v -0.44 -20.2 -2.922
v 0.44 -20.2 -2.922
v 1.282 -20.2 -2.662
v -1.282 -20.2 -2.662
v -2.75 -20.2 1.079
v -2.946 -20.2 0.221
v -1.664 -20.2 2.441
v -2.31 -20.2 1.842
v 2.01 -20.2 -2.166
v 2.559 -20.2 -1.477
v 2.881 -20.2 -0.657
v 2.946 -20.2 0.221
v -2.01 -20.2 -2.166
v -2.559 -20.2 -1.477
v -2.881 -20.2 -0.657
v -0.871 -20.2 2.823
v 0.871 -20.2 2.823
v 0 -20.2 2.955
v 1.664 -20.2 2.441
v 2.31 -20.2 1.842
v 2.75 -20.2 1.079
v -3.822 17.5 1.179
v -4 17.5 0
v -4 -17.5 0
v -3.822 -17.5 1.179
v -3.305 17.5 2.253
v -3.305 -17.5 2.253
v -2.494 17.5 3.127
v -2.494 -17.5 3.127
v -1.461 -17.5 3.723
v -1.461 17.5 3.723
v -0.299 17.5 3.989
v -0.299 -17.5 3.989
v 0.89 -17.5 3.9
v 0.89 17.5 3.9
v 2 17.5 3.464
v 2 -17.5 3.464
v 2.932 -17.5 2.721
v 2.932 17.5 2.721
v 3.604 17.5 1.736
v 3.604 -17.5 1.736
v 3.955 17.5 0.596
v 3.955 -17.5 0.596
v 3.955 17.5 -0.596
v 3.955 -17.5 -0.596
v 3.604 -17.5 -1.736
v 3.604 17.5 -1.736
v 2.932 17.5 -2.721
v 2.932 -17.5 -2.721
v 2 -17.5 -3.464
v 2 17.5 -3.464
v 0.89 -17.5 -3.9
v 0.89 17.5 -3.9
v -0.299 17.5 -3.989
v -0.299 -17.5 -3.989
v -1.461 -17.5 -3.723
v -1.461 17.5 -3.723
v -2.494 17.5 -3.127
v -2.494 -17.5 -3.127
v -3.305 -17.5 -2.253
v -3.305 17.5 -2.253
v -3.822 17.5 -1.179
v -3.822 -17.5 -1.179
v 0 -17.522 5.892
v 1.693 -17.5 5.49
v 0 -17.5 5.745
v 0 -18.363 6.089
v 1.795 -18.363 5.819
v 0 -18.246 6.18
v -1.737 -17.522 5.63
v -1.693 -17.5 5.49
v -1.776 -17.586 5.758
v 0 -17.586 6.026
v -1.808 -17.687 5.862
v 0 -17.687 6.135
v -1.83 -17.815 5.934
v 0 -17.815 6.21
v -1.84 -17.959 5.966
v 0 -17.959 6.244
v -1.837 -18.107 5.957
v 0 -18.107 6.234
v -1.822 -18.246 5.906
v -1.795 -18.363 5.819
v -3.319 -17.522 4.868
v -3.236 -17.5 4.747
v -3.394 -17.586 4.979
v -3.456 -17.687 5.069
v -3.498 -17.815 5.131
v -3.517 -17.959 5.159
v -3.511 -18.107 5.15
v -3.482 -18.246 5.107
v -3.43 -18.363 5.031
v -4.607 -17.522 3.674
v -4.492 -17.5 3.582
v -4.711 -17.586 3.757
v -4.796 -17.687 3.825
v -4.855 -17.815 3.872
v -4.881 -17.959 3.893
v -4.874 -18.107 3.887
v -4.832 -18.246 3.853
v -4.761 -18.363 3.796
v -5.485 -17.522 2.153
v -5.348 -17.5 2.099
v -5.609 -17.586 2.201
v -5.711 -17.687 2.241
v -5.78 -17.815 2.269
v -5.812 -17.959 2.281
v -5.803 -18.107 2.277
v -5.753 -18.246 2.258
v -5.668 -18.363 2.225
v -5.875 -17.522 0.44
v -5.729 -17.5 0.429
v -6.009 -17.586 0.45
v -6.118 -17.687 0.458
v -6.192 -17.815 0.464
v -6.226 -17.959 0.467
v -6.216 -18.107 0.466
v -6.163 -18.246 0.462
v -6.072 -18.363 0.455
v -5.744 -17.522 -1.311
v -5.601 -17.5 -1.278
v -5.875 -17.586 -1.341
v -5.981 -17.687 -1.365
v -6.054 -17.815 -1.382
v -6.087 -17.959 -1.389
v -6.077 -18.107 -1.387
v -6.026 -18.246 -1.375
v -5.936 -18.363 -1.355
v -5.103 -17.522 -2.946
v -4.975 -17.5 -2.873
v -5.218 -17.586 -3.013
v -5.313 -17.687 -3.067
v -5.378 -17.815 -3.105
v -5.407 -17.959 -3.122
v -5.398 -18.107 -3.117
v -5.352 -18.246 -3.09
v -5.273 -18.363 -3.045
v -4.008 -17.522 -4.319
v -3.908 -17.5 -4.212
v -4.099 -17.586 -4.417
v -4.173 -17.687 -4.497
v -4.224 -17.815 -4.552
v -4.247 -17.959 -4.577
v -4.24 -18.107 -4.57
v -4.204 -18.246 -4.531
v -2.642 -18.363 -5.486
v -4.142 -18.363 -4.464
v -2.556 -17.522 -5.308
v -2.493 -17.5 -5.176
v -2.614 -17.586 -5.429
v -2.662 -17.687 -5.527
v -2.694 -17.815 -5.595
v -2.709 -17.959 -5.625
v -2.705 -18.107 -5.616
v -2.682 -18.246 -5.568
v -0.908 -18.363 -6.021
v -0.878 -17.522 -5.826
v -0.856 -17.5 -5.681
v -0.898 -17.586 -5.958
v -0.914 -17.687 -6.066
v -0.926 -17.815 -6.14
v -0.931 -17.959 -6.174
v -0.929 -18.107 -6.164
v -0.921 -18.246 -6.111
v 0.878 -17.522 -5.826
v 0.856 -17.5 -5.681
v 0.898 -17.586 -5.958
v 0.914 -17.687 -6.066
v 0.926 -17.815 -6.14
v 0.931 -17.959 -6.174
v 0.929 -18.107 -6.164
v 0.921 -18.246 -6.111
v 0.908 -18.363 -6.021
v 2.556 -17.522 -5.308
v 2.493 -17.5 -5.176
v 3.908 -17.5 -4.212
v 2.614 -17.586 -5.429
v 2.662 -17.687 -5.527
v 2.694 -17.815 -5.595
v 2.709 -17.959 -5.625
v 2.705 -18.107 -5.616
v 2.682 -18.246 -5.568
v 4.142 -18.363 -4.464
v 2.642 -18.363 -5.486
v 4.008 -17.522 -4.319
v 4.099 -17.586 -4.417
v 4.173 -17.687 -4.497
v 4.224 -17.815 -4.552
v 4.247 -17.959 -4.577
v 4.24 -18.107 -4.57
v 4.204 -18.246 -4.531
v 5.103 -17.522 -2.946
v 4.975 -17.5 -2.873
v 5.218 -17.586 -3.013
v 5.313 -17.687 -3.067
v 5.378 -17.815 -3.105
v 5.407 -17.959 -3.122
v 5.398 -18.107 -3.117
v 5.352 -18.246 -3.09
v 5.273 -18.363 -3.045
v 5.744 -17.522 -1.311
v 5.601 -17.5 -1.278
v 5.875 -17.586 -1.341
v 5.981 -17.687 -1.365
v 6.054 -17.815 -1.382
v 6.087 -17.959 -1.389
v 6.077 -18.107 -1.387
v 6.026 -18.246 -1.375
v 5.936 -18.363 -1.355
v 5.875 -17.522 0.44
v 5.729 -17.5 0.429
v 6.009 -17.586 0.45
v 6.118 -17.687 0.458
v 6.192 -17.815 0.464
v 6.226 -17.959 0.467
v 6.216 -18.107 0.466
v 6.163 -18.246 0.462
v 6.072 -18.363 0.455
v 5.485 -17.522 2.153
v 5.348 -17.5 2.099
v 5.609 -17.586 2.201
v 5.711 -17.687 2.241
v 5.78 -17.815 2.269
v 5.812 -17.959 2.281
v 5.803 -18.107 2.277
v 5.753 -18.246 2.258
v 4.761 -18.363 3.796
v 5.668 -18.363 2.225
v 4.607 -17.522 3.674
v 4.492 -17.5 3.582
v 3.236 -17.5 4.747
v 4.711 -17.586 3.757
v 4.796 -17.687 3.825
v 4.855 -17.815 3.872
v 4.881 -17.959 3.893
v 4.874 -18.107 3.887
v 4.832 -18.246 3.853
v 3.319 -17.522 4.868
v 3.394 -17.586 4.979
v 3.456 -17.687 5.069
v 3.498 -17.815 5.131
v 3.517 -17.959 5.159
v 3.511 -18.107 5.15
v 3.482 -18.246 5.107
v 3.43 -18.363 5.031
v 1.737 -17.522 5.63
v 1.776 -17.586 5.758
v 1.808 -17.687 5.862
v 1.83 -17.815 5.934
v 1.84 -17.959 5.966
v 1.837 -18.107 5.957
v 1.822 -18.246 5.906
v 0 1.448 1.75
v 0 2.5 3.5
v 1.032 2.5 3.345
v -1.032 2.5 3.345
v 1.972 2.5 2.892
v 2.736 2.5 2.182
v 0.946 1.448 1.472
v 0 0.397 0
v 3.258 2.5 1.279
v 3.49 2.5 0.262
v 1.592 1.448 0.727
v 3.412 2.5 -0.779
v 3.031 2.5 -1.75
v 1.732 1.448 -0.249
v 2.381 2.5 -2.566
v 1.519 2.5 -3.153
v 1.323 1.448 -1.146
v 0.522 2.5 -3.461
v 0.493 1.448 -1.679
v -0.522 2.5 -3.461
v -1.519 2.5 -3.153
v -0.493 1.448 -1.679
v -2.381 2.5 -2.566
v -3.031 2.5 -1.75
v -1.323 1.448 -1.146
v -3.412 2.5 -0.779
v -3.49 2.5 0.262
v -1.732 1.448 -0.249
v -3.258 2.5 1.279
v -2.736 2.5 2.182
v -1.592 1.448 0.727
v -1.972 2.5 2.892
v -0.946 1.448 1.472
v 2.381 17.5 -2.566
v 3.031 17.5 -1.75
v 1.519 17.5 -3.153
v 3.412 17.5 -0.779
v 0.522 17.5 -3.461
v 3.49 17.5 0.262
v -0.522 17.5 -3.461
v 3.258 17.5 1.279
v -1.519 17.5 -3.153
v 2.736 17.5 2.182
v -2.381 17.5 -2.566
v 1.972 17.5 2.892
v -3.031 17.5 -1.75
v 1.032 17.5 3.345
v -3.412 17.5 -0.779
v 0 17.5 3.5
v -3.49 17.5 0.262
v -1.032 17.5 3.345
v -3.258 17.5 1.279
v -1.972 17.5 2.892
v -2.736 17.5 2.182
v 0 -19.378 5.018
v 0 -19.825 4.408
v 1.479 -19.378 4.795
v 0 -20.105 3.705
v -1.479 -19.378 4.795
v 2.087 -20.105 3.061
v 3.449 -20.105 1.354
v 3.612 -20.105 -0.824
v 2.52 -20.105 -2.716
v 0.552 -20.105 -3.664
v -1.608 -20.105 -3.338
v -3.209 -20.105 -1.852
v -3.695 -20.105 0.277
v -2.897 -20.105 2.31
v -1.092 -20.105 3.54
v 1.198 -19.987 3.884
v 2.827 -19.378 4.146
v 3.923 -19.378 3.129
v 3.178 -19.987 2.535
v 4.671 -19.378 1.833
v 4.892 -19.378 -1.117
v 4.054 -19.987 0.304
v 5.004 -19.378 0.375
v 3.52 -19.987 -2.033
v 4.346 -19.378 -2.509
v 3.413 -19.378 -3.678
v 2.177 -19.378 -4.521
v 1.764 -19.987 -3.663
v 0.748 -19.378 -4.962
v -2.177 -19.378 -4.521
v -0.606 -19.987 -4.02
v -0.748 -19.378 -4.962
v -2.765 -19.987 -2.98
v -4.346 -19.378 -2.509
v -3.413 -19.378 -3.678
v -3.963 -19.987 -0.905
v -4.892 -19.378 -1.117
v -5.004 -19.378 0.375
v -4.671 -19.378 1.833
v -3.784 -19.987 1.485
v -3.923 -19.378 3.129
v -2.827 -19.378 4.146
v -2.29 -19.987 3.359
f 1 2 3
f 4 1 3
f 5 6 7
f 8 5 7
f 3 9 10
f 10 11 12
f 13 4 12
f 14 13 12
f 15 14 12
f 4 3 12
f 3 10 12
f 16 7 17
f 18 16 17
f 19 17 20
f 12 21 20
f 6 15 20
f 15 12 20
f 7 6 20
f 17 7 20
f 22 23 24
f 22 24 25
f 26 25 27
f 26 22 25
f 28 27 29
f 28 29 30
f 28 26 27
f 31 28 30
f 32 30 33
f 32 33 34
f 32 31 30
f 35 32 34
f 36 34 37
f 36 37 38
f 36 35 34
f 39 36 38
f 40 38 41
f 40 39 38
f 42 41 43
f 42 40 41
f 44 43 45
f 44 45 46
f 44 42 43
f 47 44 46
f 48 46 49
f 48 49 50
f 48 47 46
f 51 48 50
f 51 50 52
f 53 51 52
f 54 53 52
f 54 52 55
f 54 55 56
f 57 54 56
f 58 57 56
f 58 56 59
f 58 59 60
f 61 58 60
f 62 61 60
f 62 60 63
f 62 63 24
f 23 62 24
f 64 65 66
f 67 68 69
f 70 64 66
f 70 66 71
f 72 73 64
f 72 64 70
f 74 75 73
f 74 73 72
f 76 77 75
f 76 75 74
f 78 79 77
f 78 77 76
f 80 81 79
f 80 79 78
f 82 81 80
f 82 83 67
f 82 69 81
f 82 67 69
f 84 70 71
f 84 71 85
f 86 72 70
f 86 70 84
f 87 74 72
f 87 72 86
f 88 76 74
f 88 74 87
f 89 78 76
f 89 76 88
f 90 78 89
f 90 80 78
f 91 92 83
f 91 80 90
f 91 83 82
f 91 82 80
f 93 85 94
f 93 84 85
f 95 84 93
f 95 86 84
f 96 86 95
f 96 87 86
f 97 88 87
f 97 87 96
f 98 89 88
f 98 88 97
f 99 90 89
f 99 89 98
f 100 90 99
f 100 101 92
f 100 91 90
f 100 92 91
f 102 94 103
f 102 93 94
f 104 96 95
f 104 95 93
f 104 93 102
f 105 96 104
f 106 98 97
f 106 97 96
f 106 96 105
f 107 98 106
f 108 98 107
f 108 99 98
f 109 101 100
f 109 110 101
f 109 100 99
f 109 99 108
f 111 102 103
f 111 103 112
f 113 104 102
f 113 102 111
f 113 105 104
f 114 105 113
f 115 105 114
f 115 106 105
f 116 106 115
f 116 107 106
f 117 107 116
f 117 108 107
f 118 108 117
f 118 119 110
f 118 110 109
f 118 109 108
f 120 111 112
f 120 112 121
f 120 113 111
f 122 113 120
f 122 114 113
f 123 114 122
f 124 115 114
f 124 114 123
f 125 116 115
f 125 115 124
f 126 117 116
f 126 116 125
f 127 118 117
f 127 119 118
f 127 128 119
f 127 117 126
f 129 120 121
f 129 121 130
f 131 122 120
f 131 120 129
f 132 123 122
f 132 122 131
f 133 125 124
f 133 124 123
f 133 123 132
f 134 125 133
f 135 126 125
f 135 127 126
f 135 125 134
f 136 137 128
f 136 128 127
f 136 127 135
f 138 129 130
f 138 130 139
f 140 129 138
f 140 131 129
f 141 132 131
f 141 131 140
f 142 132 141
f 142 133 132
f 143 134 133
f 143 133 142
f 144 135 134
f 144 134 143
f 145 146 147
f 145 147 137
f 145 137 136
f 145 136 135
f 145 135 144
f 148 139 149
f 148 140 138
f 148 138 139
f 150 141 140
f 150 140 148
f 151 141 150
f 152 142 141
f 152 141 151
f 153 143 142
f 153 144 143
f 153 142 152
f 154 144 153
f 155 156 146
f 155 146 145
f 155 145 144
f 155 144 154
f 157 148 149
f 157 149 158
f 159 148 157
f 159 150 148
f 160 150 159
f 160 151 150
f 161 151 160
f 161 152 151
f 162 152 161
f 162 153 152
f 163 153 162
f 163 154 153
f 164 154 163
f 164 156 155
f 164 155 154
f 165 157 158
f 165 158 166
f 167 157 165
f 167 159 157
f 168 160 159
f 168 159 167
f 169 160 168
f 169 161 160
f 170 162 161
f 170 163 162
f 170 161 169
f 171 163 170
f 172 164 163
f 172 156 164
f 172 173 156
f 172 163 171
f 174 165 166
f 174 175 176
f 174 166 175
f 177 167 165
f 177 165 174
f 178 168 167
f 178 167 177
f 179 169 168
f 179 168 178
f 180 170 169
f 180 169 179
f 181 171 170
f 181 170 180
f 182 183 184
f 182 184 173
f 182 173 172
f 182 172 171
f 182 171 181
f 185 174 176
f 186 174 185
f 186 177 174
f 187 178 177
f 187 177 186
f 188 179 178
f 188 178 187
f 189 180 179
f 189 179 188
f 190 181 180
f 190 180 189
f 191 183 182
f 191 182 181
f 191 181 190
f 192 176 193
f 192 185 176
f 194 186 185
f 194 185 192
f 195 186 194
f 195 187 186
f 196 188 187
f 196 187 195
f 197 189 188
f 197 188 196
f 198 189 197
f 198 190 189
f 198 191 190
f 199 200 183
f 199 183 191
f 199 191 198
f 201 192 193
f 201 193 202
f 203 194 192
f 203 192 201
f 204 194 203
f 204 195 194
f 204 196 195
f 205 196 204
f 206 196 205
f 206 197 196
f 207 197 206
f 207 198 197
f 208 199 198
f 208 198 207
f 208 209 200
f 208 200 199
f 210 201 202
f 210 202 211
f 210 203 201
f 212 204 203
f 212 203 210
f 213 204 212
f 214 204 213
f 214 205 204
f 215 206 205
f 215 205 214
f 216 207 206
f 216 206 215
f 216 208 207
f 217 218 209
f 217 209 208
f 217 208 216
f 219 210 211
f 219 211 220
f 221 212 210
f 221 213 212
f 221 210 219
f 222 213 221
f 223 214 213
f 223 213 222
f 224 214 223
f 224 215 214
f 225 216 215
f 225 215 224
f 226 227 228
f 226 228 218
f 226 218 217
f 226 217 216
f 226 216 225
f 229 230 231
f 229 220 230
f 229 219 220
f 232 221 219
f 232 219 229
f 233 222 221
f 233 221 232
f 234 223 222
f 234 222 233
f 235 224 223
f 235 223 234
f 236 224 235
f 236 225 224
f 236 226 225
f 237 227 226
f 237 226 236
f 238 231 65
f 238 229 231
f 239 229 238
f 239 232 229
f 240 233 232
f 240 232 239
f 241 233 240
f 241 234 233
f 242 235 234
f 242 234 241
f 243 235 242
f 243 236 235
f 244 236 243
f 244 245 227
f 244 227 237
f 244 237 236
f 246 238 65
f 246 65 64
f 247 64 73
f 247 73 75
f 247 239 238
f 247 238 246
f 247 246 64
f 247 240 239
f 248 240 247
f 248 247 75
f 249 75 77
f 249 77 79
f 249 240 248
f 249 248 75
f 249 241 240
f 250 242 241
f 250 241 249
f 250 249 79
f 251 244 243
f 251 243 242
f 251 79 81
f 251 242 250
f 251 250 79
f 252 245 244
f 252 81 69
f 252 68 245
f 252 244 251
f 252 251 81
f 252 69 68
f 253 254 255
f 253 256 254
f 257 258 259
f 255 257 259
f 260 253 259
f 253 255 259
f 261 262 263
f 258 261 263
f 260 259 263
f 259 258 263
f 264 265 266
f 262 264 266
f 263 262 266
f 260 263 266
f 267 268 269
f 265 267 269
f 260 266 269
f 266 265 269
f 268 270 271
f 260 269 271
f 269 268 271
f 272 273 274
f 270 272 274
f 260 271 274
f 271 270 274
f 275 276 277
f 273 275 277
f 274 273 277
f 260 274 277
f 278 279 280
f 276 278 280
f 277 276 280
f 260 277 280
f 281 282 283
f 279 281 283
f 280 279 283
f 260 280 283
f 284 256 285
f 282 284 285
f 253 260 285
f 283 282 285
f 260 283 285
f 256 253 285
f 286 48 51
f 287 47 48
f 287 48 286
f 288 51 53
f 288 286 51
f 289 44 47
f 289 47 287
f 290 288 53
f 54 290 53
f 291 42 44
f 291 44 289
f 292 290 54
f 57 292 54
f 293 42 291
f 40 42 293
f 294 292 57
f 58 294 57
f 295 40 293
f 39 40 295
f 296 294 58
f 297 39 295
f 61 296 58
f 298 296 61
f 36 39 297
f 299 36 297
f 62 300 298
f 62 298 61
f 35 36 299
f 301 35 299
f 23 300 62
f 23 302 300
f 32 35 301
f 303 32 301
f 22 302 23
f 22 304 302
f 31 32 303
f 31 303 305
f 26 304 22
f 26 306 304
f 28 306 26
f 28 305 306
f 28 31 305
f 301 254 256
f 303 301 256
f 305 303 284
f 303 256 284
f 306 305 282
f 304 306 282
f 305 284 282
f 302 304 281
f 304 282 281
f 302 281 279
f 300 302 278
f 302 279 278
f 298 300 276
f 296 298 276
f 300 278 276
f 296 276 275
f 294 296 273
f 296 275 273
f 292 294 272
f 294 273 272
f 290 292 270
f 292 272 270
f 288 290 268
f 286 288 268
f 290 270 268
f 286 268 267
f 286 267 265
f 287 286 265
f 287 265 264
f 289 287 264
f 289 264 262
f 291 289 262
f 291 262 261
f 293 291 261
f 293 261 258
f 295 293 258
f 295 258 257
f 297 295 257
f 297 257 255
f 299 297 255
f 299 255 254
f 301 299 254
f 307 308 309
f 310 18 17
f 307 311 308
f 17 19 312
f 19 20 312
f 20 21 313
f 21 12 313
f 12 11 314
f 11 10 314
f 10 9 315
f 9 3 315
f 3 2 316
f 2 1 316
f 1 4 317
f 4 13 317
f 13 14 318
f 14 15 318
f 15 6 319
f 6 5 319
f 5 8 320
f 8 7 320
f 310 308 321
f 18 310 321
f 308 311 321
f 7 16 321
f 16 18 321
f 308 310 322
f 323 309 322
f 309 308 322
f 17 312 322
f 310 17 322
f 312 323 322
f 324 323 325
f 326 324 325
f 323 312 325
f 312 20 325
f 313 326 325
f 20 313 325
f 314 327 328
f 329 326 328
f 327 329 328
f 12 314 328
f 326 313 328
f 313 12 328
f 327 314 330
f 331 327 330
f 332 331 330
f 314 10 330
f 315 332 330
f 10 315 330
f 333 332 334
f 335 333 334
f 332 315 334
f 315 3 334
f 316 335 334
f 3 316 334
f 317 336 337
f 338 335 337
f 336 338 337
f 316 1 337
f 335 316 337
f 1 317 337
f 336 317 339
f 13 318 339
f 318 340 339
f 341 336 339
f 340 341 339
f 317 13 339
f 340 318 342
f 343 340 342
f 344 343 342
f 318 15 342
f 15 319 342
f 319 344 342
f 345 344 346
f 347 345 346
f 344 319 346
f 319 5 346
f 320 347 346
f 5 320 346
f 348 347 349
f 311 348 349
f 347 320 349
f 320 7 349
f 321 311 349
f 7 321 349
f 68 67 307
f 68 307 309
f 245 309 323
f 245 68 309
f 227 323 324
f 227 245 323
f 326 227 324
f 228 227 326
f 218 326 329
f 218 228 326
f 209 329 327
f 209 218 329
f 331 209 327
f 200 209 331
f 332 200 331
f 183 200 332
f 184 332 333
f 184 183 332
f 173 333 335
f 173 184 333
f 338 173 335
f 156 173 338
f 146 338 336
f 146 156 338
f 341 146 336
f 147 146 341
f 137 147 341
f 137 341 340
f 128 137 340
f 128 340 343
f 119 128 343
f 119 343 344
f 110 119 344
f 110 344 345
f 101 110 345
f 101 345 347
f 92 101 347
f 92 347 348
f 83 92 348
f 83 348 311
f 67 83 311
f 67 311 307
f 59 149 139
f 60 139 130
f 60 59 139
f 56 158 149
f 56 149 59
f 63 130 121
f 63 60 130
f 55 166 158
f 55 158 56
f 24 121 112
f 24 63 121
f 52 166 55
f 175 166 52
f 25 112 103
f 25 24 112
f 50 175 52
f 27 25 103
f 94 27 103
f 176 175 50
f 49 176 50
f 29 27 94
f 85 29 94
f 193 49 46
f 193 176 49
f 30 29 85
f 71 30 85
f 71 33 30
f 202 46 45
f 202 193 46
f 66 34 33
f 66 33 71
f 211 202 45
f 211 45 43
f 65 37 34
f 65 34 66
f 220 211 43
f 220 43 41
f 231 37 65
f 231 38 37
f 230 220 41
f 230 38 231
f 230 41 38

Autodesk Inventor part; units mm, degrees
ref_plane "YZ Plane" through (0, 0, 0) normal (1, 0, 0) x (0, 1, 0)
ref_plane "XZ Plane" through (0, 0, 0) normal (0, 1, 0) x (-1, 0, 0)
ref_plane "XY Plane" through (0, 0, 0) normal (0, 0, 1) x (1, 0, 0)
sketch "Szkic1" plane through (0, 0, 0) normal (0, 1, 0) x (-1, 0, 0)
  circle A0 centre (0, 0) radius 4
  dimension "d0" = 8
extrude "Wyciągnięcie proste1" add sketch "Szkic1" along normal mid plane 35
sketch "Szkic3" plane through (0, 0, 0) normal (1, 0, 0) x (0, 1, 0)
  line L0 (-17.5, 4) -> (-17.5, -4) construction
  line L1 (-17.5, 0) -> (-17.5, 5.7452)
  line L2 (-18.363, 6.0891) -> (-19.3779, 5.0178)
  line L3 (-20.2, 2.9546) -> (-20.2, 0)
  line L4 (-20.2, 0) -> (-17.5, 0)
  arc A0 (-19.3779, 5.0178) -> (-20.2, 2.9546) centre (-17.2, 2.9546) ccw
  arc A1 (-17.5, 5.7452) -> (-18.363, 6.0891) centre (-18, 5.7452) ccw
  line L5 (-17.5, 0) -> (-13.3351, 0) construction
  point P0 (0, 0)
  point P1 (-17.5, 7)
  point P2 (-20.2, 4.15)
  dimension "d3" = 7
  dimension "d4" = 2.7
  dimension "d5" = 4.15
  dimension "d6" = 3
  dimension "d7" = 0.5
revolve "Podstawa" add sketch "Szkic3" angle 360 about axis through (0, -17.5, 0) along (0, 1, 0)
thread "Gwint1" size "M8x0.8" class "6g" standard "ISO Metric profile" full length
sketch "Szkic4" plane through (0, 17.5, 0) normal (0, 1, 0) x (1, 0, 0)
  circle A0 centre (0, 0) radius 4 projected
hole "Otwór1" at (0, 17.5, 0) direction (0, -1, 0) diameter 7 depth 15 tip angle 118
properties part number "Rdzeń_wentyla" material "Aluminium AW-7020"
